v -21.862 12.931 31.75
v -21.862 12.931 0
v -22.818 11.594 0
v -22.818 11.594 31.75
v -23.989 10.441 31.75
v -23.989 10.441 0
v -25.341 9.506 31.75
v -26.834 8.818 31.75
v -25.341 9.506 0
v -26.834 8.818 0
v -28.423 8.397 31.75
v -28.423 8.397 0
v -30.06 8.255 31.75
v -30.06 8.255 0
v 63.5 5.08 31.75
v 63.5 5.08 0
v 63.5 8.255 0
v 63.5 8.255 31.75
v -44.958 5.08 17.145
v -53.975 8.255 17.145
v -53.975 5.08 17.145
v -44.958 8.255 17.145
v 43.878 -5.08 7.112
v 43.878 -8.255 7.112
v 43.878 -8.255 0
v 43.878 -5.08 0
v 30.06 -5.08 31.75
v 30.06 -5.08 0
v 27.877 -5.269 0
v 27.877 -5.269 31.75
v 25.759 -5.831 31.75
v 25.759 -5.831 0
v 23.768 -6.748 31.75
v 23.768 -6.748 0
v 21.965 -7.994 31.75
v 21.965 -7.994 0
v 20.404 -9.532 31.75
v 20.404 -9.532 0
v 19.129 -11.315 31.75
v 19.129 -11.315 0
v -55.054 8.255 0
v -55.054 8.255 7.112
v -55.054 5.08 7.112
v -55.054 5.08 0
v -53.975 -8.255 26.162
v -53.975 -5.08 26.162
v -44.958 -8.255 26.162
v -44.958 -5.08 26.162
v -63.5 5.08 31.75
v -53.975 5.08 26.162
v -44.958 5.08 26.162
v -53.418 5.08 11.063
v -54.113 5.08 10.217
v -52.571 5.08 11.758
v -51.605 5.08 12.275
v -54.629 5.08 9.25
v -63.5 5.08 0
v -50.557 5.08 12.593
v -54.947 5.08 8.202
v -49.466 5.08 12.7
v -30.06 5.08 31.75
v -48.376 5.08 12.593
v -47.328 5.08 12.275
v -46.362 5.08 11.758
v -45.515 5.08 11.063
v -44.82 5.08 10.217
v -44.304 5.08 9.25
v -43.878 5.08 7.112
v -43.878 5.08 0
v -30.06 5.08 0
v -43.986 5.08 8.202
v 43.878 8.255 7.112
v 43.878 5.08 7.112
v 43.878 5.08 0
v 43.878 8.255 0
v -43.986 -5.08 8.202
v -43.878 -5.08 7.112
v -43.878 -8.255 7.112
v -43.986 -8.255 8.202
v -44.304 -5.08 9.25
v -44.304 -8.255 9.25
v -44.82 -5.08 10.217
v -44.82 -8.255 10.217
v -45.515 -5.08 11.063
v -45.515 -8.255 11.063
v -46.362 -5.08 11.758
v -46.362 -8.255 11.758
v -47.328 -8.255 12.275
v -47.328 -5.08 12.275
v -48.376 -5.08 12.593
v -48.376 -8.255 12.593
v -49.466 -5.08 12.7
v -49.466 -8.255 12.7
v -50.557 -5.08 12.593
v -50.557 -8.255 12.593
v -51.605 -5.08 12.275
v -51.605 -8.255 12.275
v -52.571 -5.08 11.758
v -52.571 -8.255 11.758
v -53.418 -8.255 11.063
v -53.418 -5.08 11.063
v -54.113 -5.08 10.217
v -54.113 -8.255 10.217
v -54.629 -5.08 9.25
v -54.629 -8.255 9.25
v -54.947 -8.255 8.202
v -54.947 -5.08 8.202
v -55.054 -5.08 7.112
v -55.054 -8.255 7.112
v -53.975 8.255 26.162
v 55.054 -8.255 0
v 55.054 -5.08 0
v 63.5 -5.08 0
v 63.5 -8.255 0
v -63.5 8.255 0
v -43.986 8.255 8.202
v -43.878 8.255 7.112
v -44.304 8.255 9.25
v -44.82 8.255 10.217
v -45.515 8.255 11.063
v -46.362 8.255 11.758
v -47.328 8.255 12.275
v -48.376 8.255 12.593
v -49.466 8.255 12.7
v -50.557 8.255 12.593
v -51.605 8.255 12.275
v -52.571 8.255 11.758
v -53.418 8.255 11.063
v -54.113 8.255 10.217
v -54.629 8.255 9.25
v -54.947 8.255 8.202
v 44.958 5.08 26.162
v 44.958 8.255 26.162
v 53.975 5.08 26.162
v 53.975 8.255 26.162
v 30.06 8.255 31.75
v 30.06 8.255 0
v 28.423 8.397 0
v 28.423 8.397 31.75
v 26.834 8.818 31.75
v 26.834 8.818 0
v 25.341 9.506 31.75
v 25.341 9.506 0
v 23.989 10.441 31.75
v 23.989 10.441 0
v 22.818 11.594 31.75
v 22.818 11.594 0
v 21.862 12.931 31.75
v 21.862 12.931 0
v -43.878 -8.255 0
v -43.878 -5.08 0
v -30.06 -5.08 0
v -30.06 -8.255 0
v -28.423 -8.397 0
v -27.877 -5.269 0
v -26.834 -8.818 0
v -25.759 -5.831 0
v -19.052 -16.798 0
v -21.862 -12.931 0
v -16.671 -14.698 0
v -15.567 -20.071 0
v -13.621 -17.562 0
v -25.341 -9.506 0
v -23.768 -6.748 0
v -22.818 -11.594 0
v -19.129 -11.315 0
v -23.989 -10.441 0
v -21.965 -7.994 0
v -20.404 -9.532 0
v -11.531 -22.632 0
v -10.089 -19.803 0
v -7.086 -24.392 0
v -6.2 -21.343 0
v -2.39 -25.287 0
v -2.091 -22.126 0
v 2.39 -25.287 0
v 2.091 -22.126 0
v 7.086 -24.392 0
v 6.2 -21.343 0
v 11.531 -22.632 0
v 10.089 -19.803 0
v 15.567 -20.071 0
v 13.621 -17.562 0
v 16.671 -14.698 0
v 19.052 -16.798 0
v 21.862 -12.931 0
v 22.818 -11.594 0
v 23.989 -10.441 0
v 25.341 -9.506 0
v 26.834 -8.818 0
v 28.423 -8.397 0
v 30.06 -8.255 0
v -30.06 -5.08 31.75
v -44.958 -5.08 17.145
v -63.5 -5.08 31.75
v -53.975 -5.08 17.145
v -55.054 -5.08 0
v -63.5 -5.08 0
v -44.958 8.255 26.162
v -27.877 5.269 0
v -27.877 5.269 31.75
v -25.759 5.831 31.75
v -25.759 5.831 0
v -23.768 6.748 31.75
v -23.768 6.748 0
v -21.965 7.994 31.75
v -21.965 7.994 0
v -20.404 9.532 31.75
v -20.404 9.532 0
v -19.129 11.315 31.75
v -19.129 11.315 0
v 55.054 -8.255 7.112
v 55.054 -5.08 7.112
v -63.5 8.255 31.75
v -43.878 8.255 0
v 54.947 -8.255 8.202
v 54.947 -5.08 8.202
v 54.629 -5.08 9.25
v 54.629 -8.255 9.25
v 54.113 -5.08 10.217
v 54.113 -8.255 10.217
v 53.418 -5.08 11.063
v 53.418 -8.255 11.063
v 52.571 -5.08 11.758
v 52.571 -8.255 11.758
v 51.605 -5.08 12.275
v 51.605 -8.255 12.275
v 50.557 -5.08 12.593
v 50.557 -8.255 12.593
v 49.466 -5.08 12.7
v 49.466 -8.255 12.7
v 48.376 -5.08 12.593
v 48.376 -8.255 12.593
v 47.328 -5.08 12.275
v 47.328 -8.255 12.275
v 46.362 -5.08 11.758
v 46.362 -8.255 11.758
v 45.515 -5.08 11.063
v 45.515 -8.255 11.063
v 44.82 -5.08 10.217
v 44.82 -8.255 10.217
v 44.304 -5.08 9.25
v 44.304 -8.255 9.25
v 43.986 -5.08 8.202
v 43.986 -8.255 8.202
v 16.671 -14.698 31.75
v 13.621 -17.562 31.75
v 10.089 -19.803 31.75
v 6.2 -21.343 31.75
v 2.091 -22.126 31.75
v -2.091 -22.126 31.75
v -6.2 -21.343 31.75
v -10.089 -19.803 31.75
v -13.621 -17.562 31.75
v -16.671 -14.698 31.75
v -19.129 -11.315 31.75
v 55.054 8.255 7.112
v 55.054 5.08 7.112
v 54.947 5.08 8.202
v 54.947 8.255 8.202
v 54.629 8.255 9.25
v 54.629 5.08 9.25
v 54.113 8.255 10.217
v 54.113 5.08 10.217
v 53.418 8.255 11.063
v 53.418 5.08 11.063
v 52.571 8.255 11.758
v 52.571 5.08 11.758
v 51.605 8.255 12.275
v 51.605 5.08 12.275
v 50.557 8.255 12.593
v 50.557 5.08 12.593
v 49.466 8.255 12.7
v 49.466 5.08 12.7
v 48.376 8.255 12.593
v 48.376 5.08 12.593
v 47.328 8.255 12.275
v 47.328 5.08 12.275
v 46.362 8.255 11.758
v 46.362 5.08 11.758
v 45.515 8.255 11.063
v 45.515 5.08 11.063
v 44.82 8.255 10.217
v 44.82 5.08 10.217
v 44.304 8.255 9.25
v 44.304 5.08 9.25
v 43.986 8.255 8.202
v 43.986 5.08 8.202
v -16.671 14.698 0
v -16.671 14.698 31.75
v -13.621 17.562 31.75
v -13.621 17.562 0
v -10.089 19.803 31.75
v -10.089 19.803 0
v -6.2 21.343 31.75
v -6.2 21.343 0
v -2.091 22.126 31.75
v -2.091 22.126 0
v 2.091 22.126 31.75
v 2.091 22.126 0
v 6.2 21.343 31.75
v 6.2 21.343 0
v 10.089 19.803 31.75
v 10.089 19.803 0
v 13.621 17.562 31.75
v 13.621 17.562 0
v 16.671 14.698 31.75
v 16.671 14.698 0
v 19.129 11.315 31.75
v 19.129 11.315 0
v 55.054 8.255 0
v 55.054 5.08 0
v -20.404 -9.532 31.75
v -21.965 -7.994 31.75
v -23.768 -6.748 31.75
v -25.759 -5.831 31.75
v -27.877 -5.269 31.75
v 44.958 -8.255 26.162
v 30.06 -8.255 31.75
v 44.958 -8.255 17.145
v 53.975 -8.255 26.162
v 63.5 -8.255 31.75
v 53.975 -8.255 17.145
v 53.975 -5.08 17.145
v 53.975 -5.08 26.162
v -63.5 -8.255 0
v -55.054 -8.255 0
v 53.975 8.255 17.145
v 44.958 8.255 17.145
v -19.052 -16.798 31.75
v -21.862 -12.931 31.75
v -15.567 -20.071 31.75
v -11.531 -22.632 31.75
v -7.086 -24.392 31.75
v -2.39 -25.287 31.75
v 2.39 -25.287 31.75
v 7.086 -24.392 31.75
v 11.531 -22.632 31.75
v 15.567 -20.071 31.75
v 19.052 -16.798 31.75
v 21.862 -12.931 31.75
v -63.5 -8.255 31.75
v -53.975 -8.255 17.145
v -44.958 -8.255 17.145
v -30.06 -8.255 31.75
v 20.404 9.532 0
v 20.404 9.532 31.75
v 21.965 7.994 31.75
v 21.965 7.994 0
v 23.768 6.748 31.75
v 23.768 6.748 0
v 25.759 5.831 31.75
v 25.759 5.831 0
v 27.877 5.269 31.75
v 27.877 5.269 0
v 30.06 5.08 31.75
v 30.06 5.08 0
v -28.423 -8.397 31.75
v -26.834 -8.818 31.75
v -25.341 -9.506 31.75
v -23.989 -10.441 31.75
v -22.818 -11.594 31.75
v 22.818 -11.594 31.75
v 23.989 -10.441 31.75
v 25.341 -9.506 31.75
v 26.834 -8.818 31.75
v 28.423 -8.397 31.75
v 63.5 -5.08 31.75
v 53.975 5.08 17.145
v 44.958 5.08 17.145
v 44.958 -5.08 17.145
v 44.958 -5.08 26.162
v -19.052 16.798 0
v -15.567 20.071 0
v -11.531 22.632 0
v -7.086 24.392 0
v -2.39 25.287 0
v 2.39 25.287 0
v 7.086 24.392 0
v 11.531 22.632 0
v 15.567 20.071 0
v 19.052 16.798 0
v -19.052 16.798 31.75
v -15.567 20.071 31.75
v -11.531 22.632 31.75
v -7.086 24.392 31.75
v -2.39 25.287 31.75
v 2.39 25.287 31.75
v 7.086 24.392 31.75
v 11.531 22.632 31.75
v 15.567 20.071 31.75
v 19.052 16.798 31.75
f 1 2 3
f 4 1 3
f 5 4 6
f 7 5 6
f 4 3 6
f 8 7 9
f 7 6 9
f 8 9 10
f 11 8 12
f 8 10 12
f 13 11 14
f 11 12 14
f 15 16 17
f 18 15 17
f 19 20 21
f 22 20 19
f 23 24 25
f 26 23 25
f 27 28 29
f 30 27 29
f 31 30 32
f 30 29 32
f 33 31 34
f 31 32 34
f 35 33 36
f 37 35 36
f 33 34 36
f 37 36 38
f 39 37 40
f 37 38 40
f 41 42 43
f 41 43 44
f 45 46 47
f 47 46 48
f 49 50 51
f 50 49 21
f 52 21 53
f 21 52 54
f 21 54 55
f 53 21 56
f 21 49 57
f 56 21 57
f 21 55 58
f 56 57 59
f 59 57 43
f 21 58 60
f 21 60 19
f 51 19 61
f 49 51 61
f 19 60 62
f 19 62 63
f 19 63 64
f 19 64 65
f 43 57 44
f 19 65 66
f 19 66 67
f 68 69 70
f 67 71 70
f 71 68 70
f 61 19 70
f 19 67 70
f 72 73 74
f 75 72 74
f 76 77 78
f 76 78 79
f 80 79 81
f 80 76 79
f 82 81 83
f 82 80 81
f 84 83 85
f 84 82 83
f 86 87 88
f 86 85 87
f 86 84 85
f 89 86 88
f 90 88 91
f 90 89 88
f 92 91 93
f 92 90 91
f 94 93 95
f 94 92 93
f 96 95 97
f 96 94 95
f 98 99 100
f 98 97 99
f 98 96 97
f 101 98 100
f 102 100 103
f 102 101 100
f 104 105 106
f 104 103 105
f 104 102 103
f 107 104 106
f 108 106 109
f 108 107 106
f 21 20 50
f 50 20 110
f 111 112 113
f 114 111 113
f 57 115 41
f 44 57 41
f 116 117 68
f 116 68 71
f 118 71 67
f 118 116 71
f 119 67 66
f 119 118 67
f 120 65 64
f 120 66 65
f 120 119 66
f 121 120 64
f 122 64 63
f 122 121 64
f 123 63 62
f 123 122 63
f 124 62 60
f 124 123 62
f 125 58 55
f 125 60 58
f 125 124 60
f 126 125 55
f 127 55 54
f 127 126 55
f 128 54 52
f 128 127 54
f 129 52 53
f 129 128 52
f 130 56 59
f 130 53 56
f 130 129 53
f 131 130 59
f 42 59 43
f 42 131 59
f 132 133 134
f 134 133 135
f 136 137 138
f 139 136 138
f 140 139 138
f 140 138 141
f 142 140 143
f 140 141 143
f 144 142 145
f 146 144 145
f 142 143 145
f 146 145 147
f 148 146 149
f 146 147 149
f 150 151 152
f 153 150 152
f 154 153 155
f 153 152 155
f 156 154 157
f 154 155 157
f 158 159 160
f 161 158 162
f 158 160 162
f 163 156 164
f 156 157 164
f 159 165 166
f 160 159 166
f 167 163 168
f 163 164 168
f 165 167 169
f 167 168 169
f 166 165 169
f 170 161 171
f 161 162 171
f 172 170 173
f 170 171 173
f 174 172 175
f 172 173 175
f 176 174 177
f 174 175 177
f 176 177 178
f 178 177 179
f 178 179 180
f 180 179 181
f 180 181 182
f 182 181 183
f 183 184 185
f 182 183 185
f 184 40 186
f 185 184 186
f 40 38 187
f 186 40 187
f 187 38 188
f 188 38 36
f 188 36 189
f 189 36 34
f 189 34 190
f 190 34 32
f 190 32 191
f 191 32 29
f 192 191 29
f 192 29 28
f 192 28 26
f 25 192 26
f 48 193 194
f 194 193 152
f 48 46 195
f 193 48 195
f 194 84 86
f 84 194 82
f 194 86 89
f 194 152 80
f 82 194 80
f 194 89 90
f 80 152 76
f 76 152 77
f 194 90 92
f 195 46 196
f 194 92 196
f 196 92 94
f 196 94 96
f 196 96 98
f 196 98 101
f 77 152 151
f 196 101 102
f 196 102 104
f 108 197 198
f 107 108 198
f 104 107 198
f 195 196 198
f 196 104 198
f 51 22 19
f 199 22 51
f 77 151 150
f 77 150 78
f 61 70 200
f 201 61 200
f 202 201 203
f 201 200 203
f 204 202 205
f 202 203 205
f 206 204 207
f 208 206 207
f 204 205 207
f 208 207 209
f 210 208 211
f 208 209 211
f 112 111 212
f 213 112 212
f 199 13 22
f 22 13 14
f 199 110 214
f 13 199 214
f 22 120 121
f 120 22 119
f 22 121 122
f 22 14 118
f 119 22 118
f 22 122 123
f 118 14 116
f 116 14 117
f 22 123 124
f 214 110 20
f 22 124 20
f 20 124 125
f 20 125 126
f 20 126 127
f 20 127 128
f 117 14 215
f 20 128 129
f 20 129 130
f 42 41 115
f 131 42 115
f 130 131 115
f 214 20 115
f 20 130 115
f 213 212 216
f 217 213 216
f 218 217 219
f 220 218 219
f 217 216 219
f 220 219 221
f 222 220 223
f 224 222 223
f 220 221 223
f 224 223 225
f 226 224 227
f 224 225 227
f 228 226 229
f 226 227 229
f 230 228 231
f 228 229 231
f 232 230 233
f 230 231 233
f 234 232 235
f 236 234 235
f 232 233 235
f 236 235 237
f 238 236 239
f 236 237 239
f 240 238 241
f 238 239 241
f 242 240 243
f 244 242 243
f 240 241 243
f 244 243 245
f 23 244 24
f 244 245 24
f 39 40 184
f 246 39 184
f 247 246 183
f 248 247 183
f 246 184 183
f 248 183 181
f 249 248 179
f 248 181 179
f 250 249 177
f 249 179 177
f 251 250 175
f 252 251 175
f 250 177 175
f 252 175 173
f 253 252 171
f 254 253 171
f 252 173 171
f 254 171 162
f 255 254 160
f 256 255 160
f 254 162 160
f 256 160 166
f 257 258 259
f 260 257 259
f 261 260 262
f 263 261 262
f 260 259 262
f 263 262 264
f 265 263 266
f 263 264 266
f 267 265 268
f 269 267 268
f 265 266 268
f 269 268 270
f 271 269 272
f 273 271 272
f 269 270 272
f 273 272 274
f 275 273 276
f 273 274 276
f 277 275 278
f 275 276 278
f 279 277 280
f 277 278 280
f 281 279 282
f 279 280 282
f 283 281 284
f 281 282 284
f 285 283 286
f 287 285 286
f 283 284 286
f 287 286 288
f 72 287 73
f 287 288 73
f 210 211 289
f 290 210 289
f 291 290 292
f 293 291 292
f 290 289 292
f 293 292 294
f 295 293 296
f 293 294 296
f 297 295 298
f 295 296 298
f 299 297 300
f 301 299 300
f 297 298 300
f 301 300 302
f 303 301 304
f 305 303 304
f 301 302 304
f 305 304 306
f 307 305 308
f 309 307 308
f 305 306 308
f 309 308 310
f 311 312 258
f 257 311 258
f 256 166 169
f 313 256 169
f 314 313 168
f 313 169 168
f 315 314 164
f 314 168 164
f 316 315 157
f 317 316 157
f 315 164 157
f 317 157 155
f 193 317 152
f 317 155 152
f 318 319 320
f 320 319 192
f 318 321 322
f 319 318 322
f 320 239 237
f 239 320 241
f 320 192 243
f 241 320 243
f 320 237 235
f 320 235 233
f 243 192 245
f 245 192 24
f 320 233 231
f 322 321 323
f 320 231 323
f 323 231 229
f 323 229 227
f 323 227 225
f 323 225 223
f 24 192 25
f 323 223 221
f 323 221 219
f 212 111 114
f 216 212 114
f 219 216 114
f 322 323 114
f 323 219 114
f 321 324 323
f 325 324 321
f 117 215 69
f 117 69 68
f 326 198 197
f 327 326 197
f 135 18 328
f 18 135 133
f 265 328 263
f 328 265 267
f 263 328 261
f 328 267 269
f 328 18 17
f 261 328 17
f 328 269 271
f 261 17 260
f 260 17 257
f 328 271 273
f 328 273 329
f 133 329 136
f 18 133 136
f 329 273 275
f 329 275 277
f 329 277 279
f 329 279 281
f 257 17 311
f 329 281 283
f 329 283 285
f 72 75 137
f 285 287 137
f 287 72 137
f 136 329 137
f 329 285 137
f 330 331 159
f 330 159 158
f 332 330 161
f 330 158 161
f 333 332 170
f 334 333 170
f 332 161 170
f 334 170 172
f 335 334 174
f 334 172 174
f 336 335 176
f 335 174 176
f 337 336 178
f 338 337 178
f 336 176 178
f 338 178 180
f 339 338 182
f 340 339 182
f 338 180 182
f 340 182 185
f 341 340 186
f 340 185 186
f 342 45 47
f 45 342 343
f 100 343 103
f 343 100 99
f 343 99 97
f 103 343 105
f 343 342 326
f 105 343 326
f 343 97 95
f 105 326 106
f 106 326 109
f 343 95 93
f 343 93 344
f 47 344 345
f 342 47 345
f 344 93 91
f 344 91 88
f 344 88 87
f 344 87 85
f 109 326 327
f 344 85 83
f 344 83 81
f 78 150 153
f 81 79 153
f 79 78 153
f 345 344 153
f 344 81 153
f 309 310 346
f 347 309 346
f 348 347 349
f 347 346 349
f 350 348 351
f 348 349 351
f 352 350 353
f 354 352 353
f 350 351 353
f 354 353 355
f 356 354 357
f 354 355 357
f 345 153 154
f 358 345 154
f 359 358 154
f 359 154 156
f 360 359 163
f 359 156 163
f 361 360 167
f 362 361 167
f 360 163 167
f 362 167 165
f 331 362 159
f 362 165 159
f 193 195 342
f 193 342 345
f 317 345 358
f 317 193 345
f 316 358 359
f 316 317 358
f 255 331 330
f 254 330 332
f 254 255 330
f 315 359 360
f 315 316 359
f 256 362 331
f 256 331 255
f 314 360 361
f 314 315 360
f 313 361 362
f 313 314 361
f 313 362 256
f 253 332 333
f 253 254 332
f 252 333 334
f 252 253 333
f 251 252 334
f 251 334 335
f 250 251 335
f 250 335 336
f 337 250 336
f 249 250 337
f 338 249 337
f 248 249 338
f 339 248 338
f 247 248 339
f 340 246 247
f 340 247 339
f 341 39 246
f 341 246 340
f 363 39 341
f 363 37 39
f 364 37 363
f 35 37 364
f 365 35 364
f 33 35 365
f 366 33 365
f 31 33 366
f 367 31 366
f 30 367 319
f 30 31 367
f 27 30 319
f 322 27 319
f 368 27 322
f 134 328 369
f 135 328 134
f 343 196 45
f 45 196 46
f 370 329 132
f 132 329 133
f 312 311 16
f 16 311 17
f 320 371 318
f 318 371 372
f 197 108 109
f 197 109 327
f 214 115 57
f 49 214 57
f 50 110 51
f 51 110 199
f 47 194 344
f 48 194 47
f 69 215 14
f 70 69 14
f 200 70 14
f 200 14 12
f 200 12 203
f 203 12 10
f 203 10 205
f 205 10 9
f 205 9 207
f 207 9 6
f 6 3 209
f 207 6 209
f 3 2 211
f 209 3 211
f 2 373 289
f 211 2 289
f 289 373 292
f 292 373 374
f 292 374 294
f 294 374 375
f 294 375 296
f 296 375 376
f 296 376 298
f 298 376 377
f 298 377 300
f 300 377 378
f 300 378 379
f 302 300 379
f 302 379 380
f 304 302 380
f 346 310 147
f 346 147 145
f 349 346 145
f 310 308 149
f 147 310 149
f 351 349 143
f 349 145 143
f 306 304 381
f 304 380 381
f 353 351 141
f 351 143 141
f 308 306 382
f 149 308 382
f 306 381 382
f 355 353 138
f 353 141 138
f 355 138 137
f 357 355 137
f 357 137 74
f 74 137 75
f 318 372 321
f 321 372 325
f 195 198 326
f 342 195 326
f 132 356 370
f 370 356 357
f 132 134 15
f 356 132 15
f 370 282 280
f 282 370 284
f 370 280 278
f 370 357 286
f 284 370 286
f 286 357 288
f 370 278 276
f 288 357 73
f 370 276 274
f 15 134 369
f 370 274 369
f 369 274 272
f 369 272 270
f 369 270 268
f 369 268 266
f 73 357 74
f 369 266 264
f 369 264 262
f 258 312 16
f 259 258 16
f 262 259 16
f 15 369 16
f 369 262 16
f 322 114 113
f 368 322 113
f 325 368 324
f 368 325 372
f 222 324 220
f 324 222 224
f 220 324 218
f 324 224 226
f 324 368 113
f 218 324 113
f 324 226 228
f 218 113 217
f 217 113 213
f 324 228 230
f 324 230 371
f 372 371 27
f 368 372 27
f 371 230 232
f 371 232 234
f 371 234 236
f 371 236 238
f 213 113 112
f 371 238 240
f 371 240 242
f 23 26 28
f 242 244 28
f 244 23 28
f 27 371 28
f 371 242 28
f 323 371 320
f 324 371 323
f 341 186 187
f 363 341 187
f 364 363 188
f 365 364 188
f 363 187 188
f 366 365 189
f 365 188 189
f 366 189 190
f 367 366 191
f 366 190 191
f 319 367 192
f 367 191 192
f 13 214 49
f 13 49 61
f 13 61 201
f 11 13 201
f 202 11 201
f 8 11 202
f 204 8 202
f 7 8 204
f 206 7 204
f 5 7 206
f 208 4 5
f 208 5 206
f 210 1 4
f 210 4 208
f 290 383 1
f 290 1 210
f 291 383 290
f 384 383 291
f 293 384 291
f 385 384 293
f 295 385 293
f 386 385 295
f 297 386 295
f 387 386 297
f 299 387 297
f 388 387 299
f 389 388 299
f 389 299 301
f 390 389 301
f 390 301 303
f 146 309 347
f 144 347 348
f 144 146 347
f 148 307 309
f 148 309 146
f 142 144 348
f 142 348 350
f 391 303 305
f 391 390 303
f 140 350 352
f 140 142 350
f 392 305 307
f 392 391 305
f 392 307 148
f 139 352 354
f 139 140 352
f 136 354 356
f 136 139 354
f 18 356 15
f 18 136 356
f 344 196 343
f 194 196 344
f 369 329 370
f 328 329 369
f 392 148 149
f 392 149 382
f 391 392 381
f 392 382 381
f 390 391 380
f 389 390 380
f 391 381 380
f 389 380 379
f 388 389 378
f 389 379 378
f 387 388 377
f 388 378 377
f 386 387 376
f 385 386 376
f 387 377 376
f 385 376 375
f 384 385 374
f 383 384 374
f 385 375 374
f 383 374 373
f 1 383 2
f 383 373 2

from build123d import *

# Parameters (mm, degrees)
F1_DEPTH = 31.75
F2_W     = 9.017
F2_H     = 9.017
F3_DEPTH = 25.4


with BuildPart() as f1:
    # F0 (on Top) → F1 (new body)
    with BuildSketch(Plane.XY):
        with BuildLine():
            ThreePointArc((19.129341, -11.314545), (0, -22.225), (-19.129341, -11.314545))
            ThreePointArc((-19.129341, -11.314545), (-23.768385, -6.748199), (-30.060393, -5.08))
            Line((-30.060393, -5.08), (-63.5, -5.08))
            Line((-63.5, -5.08), (-63.5, -8.255))
            Line((-63.5, -8.255), (-30.060393, -8.255))
            ThreePointArc((-30.060393, -8.255), (-25.341387, -9.506149), (-21.862104, -12.930909))
            ThreePointArc((-21.862104, -12.930909), (0, -25.4), (21.862104, -12.930909))
            ThreePointArc((21.862104, -12.930909), (25.341387, -9.506149), (30.060393, -8.255))
            Line((30.060393, -8.255), (63.5, -8.255))
            Line((63.5, -8.255), (63.5, -5.08))
            Line((63.5, -5.08), (30.060393, -5.08))
            ThreePointArc((30.060393, -5.08), (23.768385, -6.748199), (19.129341, -11.314545))
        make_face()
        with BuildLine():
            Line((-30.060393, 8.255), (-63.5, 8.255))
            Line((-63.5, 8.255), (-63.5, 5.08))
            Line((-63.5, 5.08), (-30.060393, 5.08))
            ThreePointArc((-30.060393, 5.08), (-23.768385, 6.748199), (-19.129341, 11.314545))
            ThreePointArc((-19.129341, 11.314545), (0, 22.225), (19.129341, 11.314545))
            ThreePointArc((19.129341, 11.314545), (23.768385, 6.748199), (30.060393, 5.08))
            Line((30.060393, 5.08), (63.5, 5.08))
            Line((63.5, 5.08), (63.5, 8.255))
            Line((63.5, 8.255), (30.060393, 8.255))
            ThreePointArc((30.060393, 8.255), (25.341387, 9.506149), (21.862104, 12.930909))
            ThreePointArc((21.862104, 12.930909), (0, 25.4), (-21.862104, 12.930909))
            ThreePointArc((-21.862104, 12.930909), (-25.341387, 9.506149), (-30.060393, 8.255))
        make_face()
    extrude(amount=F1_DEPTH)

    # F2 (on Front) → F3 (cut, symmetric)
    with BuildSketch(Plane.XZ):
        with Locations((-49.4665, 21.6535)):
            Rectangle(F2_W, F2_H)
        with BuildLine():
            Line((-43.8785, 0), (-43.8785, 7.112))
            ThreePointArc((-43.8785, 7.112), (-49.4665, 12.7), (-55.0545, 7.112))
            Line((-55.0545, 7.112), (-55.0545, 0))
            Line((-55.0545, 0), (-43.8785, 0))
        make_face()
        with Locations((49.4665, 21.6535)):
            Rectangle(F2_W, F2_H)
        with BuildLine():
            ThreePointArc((55.0545, 7.112), (49.4665, 12.7), (43.8785, 7.112))
            Line((43.8785, 7.112), (43.8785, 0))
            Line((43.8785, 0), (55.0545, 0))
            Line((55.0545, 0), (55.0545, 7.112))
        make_face()
    extrude(amount=F3_DEPTH, both=True, mode=Mode.SUBTRACT)


solid = f1.part
